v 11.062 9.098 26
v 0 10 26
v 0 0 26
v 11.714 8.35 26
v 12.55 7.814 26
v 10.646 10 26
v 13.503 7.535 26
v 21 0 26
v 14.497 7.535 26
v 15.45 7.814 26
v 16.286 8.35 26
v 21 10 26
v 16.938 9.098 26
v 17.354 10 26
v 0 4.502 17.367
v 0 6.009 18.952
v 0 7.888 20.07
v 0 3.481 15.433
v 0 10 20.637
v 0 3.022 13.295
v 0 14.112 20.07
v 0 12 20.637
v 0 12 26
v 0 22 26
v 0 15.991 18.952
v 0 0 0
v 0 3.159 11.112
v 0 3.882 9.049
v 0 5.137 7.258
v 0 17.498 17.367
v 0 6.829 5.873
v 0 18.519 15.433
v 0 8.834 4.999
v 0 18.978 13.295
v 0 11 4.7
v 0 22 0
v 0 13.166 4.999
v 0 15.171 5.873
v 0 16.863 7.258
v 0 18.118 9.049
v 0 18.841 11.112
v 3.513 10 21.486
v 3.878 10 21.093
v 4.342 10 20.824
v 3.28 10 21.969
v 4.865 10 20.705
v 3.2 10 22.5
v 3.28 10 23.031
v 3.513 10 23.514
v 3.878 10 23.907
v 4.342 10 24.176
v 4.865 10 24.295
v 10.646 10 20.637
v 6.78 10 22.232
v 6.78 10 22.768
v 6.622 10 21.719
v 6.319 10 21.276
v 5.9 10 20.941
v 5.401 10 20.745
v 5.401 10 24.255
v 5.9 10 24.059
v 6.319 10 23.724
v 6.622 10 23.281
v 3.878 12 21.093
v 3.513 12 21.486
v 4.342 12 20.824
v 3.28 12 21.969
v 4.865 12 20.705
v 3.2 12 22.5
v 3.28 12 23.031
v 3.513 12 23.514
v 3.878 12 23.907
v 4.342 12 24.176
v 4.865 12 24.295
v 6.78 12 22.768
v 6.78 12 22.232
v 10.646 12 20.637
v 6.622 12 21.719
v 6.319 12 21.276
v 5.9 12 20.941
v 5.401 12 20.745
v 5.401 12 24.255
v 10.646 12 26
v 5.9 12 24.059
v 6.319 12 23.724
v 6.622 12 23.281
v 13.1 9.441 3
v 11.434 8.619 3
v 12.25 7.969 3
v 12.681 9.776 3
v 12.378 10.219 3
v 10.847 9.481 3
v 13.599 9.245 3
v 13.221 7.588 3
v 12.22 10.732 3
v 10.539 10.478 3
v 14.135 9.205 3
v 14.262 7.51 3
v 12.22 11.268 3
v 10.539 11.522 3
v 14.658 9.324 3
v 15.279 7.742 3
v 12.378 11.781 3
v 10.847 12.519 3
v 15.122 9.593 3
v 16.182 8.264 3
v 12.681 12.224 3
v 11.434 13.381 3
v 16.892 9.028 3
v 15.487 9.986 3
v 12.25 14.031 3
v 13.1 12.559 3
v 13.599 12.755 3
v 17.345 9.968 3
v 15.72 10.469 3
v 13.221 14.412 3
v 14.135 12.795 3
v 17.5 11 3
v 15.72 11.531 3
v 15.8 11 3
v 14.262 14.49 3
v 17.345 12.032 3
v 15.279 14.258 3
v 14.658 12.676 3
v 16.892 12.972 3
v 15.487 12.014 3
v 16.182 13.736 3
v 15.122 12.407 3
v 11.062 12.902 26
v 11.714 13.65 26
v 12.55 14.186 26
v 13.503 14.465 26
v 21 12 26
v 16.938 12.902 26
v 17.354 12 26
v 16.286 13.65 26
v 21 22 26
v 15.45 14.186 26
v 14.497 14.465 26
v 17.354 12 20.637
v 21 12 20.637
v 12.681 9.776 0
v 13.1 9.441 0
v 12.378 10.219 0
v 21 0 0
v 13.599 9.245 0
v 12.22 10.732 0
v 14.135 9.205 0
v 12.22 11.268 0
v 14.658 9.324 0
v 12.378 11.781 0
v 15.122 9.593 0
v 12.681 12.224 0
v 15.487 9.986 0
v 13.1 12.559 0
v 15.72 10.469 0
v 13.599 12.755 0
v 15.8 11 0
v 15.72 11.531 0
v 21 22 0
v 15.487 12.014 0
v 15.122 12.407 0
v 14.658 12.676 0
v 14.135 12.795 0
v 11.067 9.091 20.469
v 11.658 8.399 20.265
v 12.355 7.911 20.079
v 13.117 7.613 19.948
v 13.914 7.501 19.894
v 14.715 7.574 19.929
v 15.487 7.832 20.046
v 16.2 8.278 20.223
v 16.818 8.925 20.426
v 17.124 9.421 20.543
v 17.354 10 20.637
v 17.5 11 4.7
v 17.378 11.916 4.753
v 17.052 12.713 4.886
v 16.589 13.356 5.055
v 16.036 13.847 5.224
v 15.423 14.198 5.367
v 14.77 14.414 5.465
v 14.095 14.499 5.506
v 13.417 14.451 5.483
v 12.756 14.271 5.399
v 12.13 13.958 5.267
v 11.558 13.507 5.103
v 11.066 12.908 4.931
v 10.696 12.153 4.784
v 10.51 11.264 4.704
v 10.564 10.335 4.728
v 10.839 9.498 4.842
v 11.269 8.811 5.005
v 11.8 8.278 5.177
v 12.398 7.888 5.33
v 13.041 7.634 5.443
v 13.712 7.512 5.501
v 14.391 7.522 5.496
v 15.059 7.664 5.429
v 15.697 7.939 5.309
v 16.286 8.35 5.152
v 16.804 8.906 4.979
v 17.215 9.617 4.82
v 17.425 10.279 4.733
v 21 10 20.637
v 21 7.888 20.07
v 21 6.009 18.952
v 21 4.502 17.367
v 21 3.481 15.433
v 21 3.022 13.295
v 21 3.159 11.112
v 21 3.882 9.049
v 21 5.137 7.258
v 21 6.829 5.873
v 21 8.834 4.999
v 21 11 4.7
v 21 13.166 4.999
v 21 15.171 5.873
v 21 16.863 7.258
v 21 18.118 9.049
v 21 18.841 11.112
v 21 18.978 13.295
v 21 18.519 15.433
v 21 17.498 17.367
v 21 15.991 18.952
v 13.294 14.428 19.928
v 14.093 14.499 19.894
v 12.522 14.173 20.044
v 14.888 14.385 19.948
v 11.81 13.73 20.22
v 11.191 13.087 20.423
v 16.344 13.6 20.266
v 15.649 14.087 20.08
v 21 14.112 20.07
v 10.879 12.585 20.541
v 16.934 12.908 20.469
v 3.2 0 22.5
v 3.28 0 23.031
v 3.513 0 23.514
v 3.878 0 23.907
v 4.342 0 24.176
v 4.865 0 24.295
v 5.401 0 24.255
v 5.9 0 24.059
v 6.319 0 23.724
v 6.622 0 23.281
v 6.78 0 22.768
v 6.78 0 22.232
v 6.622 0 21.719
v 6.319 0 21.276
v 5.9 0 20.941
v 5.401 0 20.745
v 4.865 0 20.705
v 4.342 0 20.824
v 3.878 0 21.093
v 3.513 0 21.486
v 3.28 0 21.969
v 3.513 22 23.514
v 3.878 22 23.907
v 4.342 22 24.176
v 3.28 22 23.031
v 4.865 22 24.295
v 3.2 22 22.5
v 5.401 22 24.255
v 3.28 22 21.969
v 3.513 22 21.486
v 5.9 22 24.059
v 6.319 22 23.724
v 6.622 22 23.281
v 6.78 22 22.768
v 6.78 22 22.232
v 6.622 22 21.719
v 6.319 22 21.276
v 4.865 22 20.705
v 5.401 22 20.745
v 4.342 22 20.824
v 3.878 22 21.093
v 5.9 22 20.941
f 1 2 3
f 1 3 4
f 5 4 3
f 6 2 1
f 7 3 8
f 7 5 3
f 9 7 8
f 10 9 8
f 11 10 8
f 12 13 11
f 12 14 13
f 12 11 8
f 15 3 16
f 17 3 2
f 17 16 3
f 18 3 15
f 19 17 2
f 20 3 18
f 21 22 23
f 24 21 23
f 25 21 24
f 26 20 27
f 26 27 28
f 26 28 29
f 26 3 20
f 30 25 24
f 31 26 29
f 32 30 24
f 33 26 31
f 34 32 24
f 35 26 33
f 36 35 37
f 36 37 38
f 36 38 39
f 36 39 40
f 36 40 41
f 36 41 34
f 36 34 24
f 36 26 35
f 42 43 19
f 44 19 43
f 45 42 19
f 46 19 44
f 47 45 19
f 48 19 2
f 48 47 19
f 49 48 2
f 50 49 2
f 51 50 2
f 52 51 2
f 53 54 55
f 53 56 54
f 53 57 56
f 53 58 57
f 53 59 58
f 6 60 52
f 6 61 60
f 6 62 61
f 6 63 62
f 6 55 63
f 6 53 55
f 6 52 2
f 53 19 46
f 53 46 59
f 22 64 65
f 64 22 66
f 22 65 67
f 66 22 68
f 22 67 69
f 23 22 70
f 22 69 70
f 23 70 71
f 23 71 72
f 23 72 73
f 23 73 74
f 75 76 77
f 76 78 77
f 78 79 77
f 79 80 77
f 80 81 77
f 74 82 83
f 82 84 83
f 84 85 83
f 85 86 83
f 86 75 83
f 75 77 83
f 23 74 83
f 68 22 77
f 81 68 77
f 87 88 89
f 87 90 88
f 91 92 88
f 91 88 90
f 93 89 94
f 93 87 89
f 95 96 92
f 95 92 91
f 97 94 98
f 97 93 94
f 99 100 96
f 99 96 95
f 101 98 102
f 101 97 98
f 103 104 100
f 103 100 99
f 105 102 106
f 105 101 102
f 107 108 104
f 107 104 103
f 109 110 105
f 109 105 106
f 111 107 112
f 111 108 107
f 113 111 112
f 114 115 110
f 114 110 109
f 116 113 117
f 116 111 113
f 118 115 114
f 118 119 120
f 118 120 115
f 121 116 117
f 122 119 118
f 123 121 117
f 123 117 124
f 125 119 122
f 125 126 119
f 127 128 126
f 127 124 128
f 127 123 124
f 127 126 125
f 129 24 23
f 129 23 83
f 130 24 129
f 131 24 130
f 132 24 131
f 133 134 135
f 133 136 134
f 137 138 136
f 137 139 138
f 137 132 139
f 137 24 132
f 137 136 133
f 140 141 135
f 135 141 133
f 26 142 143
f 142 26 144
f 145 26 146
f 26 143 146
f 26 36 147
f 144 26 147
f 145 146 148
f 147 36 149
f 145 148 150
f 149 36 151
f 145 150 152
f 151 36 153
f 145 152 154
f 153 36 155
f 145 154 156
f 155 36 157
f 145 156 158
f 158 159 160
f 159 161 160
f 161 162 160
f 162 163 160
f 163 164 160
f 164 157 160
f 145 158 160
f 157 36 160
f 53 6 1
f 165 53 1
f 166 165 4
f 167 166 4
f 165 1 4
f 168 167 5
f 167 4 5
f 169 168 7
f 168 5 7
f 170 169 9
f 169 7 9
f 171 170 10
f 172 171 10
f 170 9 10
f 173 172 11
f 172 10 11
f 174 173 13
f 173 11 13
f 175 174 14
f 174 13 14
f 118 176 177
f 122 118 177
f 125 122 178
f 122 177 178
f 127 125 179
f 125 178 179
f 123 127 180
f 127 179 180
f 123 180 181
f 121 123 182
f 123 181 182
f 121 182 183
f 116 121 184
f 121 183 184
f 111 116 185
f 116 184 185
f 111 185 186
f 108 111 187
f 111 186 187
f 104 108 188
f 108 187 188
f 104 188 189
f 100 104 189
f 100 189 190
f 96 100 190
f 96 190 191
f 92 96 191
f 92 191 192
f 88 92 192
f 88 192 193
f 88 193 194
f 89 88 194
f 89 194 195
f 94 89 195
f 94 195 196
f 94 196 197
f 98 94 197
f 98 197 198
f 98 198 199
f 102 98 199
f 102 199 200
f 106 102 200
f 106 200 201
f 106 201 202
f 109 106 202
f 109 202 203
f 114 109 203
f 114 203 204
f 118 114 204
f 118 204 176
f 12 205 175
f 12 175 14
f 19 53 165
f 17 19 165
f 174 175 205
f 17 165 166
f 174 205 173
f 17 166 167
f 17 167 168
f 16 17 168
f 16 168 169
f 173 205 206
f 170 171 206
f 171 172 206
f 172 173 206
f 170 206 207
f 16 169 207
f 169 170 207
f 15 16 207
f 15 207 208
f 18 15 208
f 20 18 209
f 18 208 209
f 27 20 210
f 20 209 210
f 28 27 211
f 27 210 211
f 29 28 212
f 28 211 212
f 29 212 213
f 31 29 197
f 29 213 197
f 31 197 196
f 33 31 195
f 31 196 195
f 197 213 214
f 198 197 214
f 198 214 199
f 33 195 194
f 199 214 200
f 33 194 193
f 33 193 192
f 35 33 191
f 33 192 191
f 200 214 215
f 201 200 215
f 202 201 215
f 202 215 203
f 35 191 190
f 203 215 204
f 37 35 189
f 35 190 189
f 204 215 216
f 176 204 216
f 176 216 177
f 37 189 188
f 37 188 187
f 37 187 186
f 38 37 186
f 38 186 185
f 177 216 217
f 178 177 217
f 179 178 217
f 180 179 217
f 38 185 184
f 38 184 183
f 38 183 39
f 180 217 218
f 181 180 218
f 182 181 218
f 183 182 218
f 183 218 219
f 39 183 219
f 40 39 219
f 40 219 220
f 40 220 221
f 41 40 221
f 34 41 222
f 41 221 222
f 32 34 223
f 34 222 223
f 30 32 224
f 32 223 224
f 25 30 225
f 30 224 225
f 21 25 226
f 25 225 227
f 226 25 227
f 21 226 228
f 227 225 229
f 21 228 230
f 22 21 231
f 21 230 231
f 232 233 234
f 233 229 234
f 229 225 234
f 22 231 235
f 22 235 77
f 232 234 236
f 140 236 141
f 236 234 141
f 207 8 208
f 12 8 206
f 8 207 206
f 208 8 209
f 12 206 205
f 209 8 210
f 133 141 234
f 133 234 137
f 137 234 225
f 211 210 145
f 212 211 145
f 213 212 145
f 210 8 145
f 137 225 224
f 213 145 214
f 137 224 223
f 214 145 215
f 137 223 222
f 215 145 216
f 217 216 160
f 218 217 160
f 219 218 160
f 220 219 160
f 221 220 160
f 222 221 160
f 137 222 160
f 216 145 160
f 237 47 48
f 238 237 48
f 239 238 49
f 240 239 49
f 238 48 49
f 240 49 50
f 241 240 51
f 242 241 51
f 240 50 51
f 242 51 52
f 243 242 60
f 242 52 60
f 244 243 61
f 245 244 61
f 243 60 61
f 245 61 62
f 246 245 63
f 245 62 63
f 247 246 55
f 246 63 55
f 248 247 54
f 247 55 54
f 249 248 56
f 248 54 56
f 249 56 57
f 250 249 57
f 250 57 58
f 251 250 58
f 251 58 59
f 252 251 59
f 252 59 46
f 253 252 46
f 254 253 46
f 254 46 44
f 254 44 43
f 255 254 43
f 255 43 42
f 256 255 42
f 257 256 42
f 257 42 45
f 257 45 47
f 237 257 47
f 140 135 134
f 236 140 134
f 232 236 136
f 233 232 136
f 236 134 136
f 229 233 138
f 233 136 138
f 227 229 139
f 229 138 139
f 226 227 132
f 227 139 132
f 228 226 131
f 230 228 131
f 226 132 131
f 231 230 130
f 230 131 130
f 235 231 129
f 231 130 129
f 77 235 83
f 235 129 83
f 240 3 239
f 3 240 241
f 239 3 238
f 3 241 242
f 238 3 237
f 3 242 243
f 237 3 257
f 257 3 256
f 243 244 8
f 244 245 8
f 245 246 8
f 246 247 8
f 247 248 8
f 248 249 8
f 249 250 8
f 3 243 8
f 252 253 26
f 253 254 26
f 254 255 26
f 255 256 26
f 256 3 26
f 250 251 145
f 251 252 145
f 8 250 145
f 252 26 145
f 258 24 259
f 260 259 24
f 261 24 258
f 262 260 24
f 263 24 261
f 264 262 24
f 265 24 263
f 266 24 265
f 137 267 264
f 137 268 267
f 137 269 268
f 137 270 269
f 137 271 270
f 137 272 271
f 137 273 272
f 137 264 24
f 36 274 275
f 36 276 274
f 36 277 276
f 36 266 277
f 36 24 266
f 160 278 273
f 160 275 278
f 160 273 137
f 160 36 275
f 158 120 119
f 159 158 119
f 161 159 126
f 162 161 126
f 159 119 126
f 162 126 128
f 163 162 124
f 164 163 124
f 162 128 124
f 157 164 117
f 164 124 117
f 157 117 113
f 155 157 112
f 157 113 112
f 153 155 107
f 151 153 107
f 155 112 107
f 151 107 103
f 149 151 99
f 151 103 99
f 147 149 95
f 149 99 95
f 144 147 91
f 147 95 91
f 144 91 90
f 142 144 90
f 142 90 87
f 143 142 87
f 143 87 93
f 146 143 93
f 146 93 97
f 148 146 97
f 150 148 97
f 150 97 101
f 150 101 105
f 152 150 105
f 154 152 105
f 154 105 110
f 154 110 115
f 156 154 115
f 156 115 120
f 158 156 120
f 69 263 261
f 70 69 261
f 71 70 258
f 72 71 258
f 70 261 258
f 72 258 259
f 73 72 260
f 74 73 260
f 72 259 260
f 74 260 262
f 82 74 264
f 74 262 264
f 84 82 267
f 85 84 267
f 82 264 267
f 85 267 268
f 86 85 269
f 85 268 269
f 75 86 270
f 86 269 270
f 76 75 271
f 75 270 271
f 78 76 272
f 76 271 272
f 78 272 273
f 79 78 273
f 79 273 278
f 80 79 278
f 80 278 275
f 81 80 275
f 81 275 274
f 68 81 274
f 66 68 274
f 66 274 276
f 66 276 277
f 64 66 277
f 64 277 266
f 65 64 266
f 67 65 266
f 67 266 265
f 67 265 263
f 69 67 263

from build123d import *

# Parameters (mm, degrees)
BOX_W           = 21
BOX_H           = 22
BOX_DEPTH       = 26
SKETCH_R        = 8
POCKET_DEPTH    = 21.001
SKETCH001_R     = 3.5
POCKET001_DEPTH = 23
SKETCH002_R     = 1.8
POCKET002_DEPTH = 5
SKETCH003_R     = 1.8
POCKET003_DEPTH = 22.001
SKETCH004_W     = 2
SKETCH004_H     = 11.298807
POCKET004_DEPTH = 21.001


with BuildPart() as part:
    # Box → Box (new body)
    with BuildSketch(Plane.XY):
        with Locations((10.5, 11)):
            Rectangle(BOX_W, BOX_H)
    extrude(amount=BOX_DEPTH)

    # Sketch → Pocket (cut, through all)
    with BuildSketch(Plane.YZ.offset(21)):
        with Locations((11, 12.7)):
            Circle(SKETCH_R)
    extrude(amount=-POCKET_DEPTH, mode=Mode.SUBTRACT)

    # Sketch001 → Pocket001 (cut)
    with BuildSketch(Plane.XY.offset(26)):
        with Locations((14, 11)):
            Circle(SKETCH001_R)
    extrude(amount=-POCKET001_DEPTH, mode=Mode.SUBTRACT)

    # Sketch002 → Pocket002 (cut)
    with BuildSketch(Plane.XY.offset(3)):
        with Locations((14, 11)):
            Circle(SKETCH002_R)
    extrude(amount=-POCKET002_DEPTH, mode=Mode.SUBTRACT)

    # Sketch003 → Pocket003 (cut, through all)
    with BuildSketch(Plane(origin=(0, 22, 0), x_dir=(-1, 0, 0), z_dir=(0, 1, 0))):
        with Locations((-5, 22.5)):
            Circle(SKETCH003_R)
    extrude(amount=-POCKET003_DEPTH, mode=Mode.SUBTRACT)

    # Sketch004 → Pocket004 (cut, through all)
    with BuildSketch(Plane.YZ.offset(21)):
        with Locations((11, 23.747477)):
            Rectangle(SKETCH004_W, SKETCH004_H)
    extrude(amount=-POCKET004_DEPTH, mode=Mode.SUBTRACT)


solid = part.part
